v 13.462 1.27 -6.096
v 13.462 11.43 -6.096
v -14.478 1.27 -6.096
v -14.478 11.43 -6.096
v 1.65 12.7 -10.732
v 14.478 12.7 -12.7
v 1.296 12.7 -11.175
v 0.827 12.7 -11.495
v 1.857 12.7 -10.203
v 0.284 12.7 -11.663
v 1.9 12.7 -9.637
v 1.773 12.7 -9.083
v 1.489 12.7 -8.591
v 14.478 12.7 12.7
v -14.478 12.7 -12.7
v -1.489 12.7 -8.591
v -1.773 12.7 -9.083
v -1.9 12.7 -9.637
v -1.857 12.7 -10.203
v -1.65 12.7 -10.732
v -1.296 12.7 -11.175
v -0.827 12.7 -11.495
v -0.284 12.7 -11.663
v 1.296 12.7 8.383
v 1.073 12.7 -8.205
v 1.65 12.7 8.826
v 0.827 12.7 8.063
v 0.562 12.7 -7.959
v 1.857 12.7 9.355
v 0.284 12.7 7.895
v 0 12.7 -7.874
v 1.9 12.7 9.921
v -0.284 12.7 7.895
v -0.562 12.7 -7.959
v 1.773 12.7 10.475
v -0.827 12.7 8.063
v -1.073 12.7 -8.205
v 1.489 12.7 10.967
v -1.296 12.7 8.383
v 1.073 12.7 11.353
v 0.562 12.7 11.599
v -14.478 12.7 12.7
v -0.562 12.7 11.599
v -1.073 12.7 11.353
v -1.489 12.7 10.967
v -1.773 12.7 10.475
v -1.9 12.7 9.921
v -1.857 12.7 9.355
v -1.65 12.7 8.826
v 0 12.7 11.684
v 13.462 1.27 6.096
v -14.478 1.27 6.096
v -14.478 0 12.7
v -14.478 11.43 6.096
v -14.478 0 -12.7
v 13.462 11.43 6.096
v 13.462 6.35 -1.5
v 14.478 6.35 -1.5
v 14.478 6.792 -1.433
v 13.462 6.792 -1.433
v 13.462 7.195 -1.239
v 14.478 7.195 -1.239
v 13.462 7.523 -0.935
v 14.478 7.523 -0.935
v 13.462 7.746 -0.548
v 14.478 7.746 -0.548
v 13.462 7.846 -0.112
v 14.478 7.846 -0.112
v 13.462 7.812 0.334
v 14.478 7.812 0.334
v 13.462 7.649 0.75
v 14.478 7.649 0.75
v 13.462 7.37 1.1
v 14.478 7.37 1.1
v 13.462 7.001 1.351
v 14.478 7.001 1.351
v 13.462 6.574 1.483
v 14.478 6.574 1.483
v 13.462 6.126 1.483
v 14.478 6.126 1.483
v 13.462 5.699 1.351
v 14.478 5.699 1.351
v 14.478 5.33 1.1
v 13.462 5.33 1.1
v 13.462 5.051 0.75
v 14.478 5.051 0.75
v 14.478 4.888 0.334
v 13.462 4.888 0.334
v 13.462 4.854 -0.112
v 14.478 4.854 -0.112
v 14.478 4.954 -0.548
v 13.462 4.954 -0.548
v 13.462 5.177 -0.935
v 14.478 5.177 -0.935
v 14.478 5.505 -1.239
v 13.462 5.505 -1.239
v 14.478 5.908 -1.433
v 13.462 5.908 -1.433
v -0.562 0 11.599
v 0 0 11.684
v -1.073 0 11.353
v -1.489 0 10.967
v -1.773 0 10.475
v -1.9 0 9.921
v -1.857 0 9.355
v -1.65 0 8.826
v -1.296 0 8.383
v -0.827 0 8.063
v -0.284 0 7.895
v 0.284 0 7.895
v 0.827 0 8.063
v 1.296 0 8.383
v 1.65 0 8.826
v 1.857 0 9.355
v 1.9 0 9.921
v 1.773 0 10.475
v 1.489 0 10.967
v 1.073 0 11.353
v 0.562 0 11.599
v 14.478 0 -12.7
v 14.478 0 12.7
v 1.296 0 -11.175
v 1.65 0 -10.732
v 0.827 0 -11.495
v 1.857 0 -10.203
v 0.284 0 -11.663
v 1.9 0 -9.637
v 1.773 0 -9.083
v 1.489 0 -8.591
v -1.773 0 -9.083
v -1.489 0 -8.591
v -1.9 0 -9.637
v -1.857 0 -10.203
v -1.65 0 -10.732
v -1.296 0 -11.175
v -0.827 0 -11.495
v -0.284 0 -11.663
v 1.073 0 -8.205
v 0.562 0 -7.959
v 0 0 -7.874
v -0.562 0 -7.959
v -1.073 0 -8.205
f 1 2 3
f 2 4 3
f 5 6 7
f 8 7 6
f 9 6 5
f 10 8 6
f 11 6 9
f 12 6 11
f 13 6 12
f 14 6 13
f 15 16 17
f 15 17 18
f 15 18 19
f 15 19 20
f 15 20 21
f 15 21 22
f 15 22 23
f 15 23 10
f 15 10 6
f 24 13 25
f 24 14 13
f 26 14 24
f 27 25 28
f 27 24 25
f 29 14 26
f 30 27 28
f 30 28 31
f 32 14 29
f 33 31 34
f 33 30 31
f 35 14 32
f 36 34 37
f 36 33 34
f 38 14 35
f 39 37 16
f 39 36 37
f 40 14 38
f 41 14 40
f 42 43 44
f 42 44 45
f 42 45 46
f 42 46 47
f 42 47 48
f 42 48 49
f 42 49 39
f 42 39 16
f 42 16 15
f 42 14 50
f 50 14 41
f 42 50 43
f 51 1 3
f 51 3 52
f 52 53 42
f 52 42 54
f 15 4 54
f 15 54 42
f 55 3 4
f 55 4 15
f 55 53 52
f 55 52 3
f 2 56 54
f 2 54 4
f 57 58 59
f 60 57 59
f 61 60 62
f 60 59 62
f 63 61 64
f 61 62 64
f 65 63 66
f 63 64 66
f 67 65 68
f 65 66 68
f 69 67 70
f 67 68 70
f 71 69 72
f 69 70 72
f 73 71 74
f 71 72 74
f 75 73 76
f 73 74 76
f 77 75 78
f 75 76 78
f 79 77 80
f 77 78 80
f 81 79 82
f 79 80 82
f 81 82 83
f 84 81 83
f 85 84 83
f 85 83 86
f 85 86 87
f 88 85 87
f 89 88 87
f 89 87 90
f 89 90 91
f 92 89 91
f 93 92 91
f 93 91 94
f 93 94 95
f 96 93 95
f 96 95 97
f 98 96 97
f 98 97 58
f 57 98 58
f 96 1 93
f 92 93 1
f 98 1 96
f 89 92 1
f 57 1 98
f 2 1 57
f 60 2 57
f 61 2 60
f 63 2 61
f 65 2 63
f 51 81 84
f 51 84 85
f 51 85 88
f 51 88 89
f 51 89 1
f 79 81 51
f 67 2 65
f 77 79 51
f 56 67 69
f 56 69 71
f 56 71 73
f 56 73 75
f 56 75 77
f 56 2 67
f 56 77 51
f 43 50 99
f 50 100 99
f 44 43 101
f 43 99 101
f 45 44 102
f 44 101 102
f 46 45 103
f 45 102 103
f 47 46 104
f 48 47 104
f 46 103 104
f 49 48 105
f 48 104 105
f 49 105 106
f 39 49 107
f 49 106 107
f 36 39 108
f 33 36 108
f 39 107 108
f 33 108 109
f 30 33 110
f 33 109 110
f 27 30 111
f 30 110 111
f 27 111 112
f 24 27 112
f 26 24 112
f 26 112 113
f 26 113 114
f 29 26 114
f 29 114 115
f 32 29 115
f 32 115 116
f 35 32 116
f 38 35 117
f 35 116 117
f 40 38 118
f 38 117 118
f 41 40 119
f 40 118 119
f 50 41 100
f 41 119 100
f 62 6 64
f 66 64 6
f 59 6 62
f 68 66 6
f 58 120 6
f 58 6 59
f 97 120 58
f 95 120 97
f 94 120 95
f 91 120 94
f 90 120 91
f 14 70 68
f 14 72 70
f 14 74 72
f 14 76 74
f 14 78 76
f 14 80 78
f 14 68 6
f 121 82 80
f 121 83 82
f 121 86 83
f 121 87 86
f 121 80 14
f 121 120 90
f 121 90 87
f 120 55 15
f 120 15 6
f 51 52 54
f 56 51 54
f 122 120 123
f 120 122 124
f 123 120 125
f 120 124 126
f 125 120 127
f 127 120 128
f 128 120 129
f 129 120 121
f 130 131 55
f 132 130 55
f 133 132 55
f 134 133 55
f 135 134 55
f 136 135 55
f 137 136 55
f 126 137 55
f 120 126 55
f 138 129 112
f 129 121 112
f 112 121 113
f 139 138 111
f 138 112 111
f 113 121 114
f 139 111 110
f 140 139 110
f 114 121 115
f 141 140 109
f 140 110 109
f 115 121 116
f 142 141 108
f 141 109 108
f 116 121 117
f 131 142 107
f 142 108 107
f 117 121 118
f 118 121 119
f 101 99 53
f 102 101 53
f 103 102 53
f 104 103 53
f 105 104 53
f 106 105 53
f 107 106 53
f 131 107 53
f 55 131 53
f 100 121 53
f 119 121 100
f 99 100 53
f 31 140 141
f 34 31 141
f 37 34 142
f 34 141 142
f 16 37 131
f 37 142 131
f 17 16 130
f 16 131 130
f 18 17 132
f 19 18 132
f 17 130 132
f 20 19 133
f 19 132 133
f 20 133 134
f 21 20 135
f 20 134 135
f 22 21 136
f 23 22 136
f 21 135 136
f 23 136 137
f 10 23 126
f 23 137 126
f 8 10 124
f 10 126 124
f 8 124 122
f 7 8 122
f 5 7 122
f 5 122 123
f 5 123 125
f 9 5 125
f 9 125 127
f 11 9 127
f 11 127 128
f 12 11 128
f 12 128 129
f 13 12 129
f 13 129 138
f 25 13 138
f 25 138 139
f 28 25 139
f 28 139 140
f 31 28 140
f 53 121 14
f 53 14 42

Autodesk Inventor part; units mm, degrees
ref_plane "YZ Plane" through (0, 0, 0) normal (1, 0, 0) x (0, 1, 0)
ref_plane "XZ Plane" through (0, 0, 0) normal (0, 1, 0) x (-1, 0, 0)
ref_plane "XY Plane" through (0, 0, 0) normal (0, 0, 1) x (1, 0, 0)
sketch "Sketch1" plane through (0, 0, 0) normal (0, 1, 0) x (-1, 0, 0)
  line L0 (-14.478, 12.7) -> (14.478, 12.7)
  line L1 (14.478, 12.7) -> (14.478, -12.7)
  line L2 (14.478, -12.7) -> (-14.478, -12.7)
  line L3 (-14.478, -12.7) -> (-14.478, 12.7)
  line L4 (-14.478, 12.7) -> (14.478, -12.7) construction
  line L5 (14.478, 12.7) -> (-14.478, -12.7) construction
  point P0 (0, 0)
  dimension "d0" = 28.956
  dimension "d1" = 25.4
extrude "Extrusion1" add sketch "Sketch1" along normal blind 12.7
sketch "Sketch2" plane through (0, 12.7, 0) normal (0, 1, 0) x (1, 0, 0)
  point P0 (0, 0)
  point P1 (0, -9.779)
  point P2 (0, 9.779)
  dimension "d4" = 9.779
  dimension "d5" = 19.558
hole "Hole1" at (0, 12.7, 9.779) at (0, 12.7, -9.779) direction (0, -1, 0) diameter 3.81 end through all clearance for "Flat Head Machine Screw (82)" size "#6" standard "Ansi Unified Screw Threads"
sketch "Sketch3" plane through (14.478, 0, 12.7) normal (1, 0, 0) x (0, 0, -1)
  circle A0 centre (12.7, 6.35) radius 1.5
  line L0 (25.4, 0) -> (0, 0) projected
  line L1 (0, 12.7) -> (25.4, 12.7) projected
  point P0 (12.7, 0)
  point P1 (12.7, 0)
  point P2 (11.582, 7.35)
  point P3 (13.818, 7.35)
  dimension "d13" = 3
  dimension "d14" = 6.35
  dimension "d15" = 12.7
extrude "Extrusion3" cut sketch "Sketch3" against normal through all
sketch "Sketch5" plane through (-14.478, 0, -12.7) normal (-1, 0, 0) x (0, 0, 1)
  line L0 (6.604, 1.27) -> (18.796, 1.27)
  line L1 (18.796, 1.27) -> (18.796, 11.43)
  line L2 (18.796, 11.43) -> (6.604, 11.43)
  line L3 (6.604, 11.43) -> (6.604, 1.27)
  line L4 (6.604, 1.27) -> (18.796, 11.43) construction
  line L5 (18.796, 1.27) -> (6.604, 11.43) construction
  line L6 (0, 12.7) -> (25.4, 12.7) projected
  line L7 (25.4, 0) -> (0, 0) projected
  point P0 (12.7, 0)
  point P1 (12.7, 6.35)
  dimension "d23" = 12.192
  dimension "d24" = 10.16
  dimension "d25" = 1.27
  dimension "d26" = 1.27
extrude "Extrusion5" cut sketch "Sketch5" against normal blind 27.94
equation "\"d14\" = 0.5 * d15"
equation "\"d26\" = d25"
properties part number "MotorEnclosure" material "ABS Plastic"
